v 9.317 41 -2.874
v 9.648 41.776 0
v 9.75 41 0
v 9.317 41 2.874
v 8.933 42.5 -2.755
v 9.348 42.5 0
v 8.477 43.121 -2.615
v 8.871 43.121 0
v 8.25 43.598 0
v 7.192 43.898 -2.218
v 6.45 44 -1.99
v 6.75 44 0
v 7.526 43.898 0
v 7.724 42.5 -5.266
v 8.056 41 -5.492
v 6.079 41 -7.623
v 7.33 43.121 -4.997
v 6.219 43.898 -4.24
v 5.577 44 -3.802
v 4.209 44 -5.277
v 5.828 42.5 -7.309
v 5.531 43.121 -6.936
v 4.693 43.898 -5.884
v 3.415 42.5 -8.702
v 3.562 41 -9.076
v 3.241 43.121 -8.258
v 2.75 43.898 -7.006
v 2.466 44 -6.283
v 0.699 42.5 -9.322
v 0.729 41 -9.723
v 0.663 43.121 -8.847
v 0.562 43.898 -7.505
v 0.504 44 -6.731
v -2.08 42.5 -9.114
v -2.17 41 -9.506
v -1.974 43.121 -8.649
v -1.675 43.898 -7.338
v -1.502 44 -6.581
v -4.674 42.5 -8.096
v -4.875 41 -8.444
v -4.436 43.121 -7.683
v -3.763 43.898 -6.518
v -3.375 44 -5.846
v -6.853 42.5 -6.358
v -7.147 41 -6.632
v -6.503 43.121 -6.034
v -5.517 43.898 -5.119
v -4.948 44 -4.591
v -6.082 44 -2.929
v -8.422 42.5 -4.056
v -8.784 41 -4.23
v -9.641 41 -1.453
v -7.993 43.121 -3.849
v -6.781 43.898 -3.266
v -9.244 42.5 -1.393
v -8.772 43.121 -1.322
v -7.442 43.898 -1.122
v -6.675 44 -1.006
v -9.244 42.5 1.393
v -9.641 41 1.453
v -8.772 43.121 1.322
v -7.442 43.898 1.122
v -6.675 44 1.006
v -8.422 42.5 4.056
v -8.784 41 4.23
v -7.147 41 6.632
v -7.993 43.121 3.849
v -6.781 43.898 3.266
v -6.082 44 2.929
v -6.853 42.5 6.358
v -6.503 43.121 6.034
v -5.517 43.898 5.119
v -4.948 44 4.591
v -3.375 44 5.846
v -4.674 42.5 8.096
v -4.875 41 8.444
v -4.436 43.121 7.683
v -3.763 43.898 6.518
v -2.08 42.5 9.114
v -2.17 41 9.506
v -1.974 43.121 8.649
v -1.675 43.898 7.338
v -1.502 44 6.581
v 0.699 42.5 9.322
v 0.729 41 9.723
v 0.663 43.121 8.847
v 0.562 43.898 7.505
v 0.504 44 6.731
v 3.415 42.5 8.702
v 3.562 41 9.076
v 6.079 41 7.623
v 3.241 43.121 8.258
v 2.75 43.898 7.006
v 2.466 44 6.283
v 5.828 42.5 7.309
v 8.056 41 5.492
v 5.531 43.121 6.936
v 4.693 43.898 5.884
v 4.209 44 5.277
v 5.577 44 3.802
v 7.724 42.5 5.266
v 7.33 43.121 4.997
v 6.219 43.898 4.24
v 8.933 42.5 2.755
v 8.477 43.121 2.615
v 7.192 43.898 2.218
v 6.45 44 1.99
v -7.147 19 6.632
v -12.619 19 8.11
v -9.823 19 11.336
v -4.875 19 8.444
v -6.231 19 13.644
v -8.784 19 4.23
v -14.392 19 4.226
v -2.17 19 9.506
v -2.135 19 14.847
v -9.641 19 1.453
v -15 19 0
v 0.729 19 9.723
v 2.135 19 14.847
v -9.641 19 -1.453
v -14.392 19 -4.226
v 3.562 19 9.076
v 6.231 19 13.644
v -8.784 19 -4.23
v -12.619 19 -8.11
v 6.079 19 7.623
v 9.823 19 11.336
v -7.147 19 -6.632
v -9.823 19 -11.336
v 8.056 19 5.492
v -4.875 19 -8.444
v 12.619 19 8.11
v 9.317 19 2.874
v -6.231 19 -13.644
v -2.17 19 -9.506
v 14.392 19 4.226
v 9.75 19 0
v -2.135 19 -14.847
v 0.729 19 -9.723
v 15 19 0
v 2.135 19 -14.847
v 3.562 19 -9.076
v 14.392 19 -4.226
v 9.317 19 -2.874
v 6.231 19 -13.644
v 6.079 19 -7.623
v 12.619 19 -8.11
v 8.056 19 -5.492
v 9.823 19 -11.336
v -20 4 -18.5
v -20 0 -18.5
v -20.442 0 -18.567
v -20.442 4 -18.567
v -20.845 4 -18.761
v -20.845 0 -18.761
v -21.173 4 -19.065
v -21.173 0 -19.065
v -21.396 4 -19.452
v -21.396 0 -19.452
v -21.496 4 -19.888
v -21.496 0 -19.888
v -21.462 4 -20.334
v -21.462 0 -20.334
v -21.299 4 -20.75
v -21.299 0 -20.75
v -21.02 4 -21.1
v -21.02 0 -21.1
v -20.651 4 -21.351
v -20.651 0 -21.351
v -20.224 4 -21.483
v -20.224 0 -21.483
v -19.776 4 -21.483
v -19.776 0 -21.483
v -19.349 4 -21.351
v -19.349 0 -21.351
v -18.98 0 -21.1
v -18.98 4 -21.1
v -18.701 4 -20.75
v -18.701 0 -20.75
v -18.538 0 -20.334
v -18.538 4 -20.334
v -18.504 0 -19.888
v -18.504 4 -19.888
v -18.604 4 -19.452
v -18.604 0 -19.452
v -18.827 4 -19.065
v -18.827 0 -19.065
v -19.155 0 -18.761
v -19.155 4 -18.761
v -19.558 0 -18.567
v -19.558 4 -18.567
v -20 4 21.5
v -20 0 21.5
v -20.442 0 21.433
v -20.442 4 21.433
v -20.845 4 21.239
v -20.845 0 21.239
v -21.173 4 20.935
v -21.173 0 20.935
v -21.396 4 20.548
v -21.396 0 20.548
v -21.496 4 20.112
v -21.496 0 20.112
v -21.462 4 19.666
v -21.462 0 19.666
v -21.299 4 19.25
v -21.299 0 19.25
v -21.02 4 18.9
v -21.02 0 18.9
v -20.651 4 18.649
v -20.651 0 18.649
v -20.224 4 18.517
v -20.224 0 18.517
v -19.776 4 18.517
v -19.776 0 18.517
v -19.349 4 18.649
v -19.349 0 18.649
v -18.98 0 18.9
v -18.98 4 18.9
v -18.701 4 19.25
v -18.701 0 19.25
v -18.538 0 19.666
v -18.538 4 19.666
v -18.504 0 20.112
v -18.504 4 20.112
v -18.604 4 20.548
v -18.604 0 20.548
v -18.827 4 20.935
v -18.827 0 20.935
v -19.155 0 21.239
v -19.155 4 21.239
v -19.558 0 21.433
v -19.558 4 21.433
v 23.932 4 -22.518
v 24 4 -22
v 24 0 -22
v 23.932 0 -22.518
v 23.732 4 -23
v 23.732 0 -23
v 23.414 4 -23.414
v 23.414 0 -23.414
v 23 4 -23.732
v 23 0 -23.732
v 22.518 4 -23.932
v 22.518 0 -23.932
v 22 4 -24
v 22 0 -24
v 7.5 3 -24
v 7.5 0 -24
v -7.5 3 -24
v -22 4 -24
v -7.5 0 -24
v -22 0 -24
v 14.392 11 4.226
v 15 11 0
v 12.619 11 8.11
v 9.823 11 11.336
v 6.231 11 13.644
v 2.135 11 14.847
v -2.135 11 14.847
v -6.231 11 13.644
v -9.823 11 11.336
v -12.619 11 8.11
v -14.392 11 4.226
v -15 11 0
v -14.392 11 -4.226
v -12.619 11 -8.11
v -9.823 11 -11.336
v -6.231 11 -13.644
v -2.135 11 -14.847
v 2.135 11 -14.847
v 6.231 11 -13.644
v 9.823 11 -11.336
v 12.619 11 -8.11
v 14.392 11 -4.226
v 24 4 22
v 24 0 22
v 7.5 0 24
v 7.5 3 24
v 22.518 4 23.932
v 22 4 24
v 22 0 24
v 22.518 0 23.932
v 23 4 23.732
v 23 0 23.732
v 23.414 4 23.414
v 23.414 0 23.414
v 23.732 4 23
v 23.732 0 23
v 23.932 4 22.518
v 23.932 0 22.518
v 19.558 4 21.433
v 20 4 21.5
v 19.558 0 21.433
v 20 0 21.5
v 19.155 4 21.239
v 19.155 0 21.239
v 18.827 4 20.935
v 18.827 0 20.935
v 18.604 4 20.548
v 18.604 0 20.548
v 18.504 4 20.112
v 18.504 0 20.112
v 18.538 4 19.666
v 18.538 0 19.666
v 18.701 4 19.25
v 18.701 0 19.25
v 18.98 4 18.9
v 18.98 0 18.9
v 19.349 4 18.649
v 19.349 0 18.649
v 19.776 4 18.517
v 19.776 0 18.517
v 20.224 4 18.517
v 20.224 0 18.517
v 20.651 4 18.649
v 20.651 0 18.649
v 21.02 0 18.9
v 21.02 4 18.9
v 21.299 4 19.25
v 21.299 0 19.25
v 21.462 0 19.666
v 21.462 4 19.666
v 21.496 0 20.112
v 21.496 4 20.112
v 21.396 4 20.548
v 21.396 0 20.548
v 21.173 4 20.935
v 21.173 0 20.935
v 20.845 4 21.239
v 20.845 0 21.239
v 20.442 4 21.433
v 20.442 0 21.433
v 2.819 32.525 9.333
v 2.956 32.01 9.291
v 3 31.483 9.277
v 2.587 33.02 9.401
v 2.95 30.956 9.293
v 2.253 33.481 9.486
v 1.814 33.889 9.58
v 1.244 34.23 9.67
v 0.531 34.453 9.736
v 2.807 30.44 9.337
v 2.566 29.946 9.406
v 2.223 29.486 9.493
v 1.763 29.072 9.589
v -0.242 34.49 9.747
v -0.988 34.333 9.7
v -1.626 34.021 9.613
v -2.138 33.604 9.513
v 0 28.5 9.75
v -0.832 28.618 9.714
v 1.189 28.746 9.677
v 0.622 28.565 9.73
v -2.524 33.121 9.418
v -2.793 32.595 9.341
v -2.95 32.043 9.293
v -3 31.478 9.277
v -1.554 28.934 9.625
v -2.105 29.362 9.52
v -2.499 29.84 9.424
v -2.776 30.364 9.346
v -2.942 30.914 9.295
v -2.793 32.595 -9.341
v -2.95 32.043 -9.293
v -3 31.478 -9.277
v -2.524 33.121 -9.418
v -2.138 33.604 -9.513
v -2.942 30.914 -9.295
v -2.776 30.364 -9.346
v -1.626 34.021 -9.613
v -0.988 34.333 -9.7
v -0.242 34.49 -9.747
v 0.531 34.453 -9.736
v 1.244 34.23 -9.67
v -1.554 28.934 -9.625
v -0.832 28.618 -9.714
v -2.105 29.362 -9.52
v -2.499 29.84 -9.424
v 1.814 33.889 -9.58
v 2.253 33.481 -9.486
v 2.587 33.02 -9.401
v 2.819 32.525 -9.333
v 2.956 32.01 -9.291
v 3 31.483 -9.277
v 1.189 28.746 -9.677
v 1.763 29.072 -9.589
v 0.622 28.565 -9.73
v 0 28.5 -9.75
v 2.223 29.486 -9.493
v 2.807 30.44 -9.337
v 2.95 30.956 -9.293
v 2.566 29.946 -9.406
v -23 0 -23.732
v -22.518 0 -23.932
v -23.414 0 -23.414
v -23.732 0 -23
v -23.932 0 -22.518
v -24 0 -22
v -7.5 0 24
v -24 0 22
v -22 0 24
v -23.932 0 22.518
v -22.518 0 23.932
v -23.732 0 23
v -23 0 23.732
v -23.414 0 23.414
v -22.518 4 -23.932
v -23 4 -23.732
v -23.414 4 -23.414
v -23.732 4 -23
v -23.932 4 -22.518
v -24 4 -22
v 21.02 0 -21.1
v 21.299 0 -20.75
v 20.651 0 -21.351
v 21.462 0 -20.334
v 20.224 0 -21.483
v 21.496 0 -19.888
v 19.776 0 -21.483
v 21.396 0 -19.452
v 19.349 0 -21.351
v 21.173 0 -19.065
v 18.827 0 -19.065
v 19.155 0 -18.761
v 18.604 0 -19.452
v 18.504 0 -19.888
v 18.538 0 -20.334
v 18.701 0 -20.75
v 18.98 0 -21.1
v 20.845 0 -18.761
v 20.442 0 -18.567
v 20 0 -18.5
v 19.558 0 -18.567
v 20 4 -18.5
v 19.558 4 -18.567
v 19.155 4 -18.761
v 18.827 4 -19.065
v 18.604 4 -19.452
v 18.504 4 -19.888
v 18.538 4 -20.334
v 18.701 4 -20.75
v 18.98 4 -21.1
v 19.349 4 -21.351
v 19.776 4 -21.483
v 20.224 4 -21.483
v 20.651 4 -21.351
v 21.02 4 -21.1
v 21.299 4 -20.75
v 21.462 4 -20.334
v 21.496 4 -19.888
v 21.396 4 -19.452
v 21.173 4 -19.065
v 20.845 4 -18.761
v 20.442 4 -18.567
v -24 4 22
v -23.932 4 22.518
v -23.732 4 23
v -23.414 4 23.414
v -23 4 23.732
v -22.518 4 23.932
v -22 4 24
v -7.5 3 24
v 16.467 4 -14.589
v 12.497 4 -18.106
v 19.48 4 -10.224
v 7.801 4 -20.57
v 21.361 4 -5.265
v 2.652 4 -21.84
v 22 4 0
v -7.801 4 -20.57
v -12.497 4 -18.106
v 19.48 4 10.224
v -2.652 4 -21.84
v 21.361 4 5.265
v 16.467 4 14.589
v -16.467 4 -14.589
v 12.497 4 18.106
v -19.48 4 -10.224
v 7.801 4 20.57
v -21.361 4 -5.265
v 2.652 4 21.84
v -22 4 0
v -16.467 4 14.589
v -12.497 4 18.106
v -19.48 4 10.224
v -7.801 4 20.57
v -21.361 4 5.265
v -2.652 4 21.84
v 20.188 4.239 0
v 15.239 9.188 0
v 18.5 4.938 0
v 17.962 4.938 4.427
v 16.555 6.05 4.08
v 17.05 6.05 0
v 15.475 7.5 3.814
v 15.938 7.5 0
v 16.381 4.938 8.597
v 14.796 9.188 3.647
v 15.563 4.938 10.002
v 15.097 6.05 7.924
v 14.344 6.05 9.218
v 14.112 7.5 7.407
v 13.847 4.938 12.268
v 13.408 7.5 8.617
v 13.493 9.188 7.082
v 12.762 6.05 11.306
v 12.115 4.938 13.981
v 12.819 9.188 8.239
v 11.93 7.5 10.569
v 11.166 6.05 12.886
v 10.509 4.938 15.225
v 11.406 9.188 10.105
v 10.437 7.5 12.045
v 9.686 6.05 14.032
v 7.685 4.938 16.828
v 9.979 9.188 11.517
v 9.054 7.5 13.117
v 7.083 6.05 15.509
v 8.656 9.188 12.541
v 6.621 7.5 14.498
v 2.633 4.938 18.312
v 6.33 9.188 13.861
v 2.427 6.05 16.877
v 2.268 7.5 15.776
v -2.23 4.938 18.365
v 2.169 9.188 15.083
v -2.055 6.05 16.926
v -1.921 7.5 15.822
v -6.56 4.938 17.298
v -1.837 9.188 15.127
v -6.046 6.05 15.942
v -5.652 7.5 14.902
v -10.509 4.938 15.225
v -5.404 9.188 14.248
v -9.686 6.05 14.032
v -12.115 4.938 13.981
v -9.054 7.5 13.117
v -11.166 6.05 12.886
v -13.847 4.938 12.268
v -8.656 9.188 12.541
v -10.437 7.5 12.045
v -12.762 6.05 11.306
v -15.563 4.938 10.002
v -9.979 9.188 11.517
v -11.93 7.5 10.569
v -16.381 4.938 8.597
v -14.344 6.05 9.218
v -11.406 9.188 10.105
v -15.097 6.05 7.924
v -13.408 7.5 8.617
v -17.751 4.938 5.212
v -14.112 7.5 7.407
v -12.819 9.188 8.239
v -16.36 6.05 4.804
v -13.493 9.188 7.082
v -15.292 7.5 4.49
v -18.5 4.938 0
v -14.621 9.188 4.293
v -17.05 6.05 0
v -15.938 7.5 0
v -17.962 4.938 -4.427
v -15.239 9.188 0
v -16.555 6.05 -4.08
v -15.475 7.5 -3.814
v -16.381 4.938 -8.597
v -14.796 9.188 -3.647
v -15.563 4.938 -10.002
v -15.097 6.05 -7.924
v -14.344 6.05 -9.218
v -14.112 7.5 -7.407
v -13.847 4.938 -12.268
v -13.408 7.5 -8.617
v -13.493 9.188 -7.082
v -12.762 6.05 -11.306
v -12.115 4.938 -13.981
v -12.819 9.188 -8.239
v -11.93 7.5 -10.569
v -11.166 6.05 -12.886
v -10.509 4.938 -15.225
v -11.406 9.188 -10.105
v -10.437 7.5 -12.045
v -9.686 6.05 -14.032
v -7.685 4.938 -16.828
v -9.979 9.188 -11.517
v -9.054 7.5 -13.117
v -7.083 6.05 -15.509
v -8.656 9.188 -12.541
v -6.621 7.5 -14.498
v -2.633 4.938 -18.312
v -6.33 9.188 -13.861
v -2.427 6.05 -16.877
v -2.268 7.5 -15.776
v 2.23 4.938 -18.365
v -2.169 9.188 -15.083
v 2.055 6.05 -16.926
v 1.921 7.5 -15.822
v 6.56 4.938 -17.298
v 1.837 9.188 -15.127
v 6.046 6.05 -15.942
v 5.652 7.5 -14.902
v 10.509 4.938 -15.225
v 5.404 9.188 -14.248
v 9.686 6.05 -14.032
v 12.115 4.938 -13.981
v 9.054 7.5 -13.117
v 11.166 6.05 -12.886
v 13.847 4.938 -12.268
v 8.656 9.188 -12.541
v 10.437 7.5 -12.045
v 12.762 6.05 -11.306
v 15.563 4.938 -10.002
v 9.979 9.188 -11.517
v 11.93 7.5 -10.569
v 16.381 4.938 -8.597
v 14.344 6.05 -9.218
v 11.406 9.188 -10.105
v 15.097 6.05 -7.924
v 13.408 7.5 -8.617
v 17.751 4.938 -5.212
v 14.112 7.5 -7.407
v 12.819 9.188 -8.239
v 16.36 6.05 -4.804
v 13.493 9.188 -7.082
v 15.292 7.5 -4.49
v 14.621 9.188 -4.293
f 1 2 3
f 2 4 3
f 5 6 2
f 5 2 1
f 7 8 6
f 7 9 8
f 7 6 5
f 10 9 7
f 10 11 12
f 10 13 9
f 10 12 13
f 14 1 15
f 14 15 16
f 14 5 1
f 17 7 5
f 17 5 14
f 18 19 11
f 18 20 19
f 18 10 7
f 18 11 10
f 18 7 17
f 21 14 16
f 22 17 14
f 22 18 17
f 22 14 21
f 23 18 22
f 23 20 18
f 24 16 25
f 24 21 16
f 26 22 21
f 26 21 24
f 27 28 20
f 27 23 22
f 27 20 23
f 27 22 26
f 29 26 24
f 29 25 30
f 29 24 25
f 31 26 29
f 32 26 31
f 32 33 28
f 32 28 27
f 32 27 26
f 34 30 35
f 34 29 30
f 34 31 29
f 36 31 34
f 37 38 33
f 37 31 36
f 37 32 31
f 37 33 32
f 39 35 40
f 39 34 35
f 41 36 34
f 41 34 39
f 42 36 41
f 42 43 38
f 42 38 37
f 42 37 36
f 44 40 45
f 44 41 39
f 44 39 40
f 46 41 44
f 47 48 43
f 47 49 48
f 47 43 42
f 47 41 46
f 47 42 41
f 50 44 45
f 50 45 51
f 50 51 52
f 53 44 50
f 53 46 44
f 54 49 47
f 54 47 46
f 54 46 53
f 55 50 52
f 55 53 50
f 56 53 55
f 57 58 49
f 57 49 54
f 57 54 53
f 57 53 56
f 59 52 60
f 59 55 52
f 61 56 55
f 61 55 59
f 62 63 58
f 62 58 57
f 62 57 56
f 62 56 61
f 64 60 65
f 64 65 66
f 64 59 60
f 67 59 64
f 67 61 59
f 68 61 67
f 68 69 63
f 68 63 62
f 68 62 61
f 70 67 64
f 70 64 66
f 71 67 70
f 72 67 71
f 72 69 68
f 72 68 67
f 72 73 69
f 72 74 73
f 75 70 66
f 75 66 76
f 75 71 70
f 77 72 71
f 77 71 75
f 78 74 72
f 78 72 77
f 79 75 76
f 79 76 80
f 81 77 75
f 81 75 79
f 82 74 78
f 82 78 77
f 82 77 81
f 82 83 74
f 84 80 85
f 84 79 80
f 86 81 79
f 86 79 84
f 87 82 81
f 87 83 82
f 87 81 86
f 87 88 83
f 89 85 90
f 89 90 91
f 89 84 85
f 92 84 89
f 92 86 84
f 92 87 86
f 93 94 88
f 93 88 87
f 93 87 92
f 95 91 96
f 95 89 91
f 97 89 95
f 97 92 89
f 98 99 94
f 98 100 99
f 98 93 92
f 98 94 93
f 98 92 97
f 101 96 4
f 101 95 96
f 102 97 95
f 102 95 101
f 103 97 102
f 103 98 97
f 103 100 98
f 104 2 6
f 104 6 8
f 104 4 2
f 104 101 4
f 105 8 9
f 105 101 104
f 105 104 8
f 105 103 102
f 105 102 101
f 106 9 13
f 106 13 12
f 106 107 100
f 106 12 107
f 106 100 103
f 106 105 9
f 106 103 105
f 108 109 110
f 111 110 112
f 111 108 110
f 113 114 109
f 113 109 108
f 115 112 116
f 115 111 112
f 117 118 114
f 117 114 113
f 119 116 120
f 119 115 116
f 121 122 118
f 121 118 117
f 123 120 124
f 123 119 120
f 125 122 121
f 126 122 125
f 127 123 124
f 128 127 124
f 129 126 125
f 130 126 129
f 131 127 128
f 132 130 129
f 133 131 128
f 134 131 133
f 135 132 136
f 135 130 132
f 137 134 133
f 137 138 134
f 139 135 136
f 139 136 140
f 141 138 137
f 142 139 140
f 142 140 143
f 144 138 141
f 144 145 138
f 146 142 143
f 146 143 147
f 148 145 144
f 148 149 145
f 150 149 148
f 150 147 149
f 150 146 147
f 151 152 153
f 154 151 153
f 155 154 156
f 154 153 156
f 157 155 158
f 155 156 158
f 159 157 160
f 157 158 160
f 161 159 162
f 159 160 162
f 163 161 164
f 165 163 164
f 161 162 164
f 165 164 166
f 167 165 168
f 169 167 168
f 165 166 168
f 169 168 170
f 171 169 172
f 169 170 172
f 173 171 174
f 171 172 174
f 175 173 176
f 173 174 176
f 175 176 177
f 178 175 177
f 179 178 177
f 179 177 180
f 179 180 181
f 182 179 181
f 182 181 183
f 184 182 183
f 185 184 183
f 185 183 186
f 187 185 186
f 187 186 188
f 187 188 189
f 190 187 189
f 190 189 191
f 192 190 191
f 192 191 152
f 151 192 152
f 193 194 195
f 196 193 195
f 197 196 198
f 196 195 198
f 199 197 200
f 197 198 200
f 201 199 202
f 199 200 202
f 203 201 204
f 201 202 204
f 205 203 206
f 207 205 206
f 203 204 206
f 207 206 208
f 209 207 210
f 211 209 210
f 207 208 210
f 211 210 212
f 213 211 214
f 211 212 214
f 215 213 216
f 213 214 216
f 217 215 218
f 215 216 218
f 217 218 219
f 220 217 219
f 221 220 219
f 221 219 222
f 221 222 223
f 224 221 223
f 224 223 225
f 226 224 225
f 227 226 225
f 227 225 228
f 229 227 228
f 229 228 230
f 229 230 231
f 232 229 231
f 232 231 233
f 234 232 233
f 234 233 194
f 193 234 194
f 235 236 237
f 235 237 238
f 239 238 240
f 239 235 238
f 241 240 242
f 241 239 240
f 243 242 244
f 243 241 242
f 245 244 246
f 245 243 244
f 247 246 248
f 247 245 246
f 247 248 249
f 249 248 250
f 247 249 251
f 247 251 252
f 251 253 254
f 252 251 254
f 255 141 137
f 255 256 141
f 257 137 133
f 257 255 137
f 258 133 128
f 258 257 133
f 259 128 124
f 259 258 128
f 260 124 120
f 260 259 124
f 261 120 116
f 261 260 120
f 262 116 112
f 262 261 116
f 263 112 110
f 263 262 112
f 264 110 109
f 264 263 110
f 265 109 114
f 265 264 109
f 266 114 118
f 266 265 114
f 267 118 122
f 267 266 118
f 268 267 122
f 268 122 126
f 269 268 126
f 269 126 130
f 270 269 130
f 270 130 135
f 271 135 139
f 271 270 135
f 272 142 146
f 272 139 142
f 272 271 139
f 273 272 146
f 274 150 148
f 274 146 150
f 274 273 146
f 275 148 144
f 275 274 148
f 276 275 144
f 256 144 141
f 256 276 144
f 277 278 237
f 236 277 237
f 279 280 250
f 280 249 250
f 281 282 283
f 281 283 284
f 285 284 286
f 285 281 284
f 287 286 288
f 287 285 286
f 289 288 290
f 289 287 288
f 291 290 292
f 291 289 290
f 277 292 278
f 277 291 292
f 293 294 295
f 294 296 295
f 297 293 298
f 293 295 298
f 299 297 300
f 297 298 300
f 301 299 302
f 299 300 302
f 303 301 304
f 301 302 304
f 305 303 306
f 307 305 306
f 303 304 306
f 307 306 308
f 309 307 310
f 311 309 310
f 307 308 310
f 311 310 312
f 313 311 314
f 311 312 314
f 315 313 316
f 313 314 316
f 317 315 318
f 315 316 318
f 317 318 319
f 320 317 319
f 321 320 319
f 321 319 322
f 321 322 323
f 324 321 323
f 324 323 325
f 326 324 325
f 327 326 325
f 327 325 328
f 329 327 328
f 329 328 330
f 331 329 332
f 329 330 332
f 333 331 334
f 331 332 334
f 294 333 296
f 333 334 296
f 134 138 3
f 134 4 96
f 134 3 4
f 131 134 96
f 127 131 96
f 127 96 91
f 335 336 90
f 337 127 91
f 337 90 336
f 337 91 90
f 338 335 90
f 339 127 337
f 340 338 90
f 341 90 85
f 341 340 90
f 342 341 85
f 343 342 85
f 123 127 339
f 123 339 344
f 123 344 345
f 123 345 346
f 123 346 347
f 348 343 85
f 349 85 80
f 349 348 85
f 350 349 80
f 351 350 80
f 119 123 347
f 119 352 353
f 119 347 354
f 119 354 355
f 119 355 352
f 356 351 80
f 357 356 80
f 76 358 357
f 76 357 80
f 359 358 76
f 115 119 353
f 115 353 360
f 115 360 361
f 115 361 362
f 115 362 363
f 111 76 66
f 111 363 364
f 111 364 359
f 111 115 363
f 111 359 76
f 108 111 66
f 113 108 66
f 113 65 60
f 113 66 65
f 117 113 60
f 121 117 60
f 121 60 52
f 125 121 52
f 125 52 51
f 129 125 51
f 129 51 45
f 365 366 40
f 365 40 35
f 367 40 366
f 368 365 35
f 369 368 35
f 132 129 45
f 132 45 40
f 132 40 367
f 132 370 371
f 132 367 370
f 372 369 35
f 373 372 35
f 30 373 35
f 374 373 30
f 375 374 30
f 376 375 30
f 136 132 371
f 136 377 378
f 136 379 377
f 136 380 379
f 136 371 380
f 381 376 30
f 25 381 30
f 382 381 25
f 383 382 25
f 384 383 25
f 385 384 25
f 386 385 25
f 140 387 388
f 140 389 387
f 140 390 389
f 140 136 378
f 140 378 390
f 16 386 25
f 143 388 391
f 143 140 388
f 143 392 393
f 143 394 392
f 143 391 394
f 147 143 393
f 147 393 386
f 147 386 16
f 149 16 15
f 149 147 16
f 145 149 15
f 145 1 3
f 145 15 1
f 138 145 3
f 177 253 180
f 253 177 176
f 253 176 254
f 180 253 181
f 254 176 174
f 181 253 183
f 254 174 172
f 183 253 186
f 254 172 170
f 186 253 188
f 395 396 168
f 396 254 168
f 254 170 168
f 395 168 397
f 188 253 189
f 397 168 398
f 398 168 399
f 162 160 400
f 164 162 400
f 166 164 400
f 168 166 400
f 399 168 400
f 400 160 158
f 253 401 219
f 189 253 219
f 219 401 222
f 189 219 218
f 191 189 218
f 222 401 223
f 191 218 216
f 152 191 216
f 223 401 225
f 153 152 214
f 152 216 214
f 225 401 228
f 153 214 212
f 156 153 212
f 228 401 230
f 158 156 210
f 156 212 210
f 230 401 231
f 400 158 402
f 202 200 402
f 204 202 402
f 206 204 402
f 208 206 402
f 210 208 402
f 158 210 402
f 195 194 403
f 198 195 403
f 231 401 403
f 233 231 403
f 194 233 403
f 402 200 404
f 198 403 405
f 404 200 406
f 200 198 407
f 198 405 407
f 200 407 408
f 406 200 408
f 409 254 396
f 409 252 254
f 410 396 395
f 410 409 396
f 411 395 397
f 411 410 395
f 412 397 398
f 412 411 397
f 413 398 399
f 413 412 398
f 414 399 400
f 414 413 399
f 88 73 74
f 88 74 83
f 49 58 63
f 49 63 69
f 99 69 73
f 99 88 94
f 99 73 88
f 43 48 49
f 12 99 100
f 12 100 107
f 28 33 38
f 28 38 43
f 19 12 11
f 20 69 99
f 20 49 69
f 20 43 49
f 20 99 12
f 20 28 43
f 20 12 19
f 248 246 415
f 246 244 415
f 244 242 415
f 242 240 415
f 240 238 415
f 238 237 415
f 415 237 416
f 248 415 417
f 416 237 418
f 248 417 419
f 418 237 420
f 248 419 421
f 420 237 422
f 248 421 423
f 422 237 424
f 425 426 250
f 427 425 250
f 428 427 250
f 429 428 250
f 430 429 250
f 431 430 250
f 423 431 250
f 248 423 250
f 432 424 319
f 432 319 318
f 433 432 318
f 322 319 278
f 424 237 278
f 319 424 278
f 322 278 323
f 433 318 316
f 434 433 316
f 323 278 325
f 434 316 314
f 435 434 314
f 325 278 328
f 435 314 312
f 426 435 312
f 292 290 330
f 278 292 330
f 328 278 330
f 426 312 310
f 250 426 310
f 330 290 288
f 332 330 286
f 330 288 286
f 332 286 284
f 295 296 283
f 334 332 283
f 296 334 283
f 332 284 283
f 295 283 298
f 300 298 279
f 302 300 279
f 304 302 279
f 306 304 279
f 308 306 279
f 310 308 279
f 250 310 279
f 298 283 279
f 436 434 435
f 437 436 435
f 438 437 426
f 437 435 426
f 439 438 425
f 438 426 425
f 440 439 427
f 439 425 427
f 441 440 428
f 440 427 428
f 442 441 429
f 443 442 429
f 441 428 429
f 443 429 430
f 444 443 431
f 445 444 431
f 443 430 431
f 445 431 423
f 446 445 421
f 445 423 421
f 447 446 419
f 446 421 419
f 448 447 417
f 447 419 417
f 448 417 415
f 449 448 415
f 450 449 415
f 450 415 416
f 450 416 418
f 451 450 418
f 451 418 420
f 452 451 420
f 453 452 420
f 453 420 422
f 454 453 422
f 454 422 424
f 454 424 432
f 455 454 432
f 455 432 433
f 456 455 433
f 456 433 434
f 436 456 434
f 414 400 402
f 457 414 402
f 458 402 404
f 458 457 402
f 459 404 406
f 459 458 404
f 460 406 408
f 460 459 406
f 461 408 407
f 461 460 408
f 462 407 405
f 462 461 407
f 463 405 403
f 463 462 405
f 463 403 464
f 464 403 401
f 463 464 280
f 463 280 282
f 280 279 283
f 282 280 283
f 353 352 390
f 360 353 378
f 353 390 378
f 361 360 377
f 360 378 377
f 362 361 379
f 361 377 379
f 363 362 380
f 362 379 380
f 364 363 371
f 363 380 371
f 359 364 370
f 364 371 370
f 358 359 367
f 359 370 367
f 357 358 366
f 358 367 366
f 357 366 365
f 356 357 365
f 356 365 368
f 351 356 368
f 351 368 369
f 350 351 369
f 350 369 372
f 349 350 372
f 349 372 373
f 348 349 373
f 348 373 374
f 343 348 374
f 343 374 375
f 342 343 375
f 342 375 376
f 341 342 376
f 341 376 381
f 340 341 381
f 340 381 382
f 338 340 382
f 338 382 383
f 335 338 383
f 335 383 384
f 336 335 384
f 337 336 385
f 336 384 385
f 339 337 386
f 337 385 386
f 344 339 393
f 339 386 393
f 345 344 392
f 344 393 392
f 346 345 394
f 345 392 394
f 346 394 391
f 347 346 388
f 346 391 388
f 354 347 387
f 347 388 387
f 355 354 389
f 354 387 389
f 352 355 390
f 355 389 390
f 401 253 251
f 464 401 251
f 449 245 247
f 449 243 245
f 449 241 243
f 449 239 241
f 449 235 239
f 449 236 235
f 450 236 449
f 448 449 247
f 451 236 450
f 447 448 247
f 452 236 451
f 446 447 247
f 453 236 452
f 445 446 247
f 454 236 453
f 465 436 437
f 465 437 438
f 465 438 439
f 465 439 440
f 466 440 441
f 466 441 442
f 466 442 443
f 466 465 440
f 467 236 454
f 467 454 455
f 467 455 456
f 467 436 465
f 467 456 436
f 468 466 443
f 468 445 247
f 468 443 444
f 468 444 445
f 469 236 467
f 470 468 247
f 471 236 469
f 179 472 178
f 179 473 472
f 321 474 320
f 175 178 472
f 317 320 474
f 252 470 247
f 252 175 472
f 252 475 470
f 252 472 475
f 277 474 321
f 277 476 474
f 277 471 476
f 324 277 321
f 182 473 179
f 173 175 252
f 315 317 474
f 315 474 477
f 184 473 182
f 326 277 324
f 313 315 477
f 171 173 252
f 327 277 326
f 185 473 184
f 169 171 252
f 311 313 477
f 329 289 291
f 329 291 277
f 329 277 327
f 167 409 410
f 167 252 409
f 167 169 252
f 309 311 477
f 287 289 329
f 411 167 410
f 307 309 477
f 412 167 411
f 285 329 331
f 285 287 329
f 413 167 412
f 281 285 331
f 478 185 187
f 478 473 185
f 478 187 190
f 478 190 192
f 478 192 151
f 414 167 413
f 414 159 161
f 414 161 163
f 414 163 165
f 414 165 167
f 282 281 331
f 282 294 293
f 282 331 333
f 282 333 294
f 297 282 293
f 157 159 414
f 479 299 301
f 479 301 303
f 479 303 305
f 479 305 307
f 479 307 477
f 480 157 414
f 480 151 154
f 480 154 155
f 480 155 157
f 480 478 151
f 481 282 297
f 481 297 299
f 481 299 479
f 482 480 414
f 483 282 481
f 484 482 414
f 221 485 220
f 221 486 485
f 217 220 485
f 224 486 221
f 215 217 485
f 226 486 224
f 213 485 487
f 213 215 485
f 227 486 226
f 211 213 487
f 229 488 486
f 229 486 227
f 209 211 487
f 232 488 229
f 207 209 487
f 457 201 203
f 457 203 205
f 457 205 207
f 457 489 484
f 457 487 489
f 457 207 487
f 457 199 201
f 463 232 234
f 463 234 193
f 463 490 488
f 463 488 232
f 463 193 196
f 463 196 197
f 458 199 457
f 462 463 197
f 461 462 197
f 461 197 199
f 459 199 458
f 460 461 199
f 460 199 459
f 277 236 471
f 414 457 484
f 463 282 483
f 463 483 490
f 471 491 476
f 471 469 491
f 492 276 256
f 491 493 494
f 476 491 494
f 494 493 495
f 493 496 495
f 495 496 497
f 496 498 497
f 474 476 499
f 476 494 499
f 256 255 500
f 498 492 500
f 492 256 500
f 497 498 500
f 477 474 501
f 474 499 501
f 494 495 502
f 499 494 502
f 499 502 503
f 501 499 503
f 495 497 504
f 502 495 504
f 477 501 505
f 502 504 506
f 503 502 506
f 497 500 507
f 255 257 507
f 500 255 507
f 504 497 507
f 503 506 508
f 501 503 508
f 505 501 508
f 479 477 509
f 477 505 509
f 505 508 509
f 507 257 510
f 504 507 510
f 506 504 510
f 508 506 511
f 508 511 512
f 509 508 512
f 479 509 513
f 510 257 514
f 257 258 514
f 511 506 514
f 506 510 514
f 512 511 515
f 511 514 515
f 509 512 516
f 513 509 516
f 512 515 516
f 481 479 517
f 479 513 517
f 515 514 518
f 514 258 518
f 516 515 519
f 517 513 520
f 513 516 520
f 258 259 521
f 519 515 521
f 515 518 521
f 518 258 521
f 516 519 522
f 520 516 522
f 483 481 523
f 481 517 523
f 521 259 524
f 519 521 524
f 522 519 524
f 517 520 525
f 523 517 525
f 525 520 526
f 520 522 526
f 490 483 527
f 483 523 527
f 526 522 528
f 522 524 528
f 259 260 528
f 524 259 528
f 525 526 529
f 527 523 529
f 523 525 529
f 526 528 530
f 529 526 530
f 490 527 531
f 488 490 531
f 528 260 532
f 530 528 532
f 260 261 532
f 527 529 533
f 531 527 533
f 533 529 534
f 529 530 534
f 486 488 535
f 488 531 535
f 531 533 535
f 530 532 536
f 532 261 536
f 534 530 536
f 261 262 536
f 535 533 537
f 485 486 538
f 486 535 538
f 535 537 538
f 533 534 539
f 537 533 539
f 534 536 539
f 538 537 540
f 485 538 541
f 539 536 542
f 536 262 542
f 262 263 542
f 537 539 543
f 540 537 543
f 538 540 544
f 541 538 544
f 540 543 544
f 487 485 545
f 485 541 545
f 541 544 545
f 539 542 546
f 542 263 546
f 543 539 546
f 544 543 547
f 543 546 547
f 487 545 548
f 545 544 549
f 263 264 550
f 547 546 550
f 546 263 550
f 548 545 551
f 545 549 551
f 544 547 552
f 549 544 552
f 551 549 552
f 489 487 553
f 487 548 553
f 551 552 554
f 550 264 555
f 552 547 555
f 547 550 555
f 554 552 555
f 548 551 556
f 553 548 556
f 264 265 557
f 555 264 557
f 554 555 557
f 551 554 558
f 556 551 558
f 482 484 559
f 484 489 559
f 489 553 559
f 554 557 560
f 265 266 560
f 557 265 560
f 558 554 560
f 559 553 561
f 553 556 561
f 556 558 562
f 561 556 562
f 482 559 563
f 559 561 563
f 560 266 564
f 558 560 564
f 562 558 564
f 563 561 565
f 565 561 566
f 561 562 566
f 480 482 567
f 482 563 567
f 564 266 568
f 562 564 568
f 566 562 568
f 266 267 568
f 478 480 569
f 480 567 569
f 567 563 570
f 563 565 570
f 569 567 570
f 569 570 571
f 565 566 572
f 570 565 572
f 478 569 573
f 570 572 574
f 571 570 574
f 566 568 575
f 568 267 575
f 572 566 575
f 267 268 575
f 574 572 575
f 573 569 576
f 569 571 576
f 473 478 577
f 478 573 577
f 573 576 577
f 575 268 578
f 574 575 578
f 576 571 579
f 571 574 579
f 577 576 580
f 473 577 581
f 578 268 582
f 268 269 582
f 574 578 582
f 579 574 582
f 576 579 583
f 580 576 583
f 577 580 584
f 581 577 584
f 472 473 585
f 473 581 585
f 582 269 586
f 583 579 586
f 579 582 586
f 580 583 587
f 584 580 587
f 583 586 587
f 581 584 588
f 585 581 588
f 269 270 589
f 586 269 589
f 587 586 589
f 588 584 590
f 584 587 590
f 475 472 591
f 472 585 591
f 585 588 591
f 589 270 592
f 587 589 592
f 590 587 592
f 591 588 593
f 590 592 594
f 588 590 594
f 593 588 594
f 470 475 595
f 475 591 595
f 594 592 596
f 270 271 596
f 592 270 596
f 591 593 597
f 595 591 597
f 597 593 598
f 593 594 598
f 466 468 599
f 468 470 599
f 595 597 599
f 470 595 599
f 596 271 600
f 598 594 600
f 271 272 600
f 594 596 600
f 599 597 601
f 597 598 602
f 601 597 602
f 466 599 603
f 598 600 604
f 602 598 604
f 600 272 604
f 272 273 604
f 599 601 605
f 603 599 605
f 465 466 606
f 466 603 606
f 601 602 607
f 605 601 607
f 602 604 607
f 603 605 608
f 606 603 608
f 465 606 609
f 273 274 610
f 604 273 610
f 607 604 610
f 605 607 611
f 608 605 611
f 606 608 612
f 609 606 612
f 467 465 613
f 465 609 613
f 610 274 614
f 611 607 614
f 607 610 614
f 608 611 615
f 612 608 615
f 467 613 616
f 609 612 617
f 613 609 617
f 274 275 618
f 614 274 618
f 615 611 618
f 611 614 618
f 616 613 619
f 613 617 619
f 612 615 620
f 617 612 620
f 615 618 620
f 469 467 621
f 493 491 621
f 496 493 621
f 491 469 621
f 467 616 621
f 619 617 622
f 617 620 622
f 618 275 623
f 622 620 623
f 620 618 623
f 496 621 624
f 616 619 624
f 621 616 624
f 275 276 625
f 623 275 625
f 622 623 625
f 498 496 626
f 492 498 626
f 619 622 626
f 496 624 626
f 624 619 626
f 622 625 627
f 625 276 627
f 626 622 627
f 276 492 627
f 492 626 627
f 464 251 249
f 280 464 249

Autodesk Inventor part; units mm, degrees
ref_plane "YZ Plane" through (0, 0, 0) normal (1, 0, 0) x (0, 1, 0)
ref_plane "XZ Plane" through (0, 0, 0) normal (0, 1, 0) x (-1, 0, 0)
ref_plane "XY Plane" through (0, 0, 0) normal (0, 0, 1) x (1, 0, 0)
sketch "Sketch1" plane through (0, 0, 0) normal (0, 1, 0) x (-1, 0, 0)
  line L0 (24, 24) -> (-24, 24)
  line L1 (-24, 24) -> (-24, -24)
  line L2 (-24, -24) -> (24, -24)
  line L3 (24, -24) -> (24, 24)
  line L4 (24, 24) -> (-24, -24) construction
  line L5 (-24, 24) -> (24, -24) construction
  point P0 (0, 0)
  dimension "d0" = 48
  dimension "d1" = 48
extrude "Extrusion1" add sketch "Sketch1" along normal blind 4
sketch "Sketch2" plane through (0, 4, 0) normal (0, 1, 0) x (1, 0, 0)
  circle A0 centre (0, 0) radius 15
  dimension "d4" = 30
extrude "Extrusion2" add sketch "Sketch2" along normal blind 15
fillet "Fillet1" radius 7 1 edges at (-15, 4, 0)
sketch "Sketch4" plane through (0, 4, 0) normal (0, 1, 0) x (1, 0, 0)
  line L0 (20, 20) -> (-20, 20) construction
  line L1 (-20, 20) -> (-20, -20) construction
  line L2 (-20, -20) -> (20, -20) construction
  line L3 (20, -20) -> (20, 20) construction
  line L4 (20, 20) -> (-20, -20) construction
  line L5 (-20, 20) -> (20, -20) construction
  point P0 (0, 0)
  dimension "d11" = 40
  dimension "d12" = 40
hole "Hole1" at (-20, 4, 20) at (-20, 4, -20) at (20, 4, 20) at (20, 4, -20) direction (0, -1, 0) diameter 3 end through all
fillet "Fillet2" radius 2 4 edges at (24, 2, 24) (-24, 2, 24) (24, 2, -24) (-24, 2, -24)
sketch "Sketch5" plane through (22, 0, -24) normal (0, 0, -1) x (-1, 0, 0)
  line L0 (14.5, -3) -> (29.5, -3)
  line L1 (29.5, -3) -> (29.5, 3)
  line L2 (29.5, 3) -> (14.5, 3)
  line L3 (14.5, 3) -> (14.5, -3)
  line L4 (14.5, -3) -> (29.5, 3) construction
  line L5 (29.5, -3) -> (14.5, 3) construction
  point P0 (22, 0)
  dimension "d21" = 15
  dimension "d22" = 6
extrude "Extrusion4" cut sketch "Sketch5" against normal blind 80
sketch "Sketch6" plane through (0, 19, 0) normal (0, 1, 0) x (1, 0, 0)
  circle A0 centre (0, 0) radius 9.75
  dimension "d25" = 19.5
extrude "Extrusion5" add sketch "Sketch6" along normal blind 25
fillet "Fillet3" radius 3 1 edges at (-9.75, 44, 0)
sketch "Sketch7" plane through (-22, 4, 24) normal (0, 0, 1) x (1, 0, 0)
  line L0 (22, -4) -> (22, 27.5) construction
  dimension "d29" = 31.5
hole "Hole2" at (0, 31.5, 24) direction (0, 0, -1) diameter 6 end through all
properties part number "adaptor"
